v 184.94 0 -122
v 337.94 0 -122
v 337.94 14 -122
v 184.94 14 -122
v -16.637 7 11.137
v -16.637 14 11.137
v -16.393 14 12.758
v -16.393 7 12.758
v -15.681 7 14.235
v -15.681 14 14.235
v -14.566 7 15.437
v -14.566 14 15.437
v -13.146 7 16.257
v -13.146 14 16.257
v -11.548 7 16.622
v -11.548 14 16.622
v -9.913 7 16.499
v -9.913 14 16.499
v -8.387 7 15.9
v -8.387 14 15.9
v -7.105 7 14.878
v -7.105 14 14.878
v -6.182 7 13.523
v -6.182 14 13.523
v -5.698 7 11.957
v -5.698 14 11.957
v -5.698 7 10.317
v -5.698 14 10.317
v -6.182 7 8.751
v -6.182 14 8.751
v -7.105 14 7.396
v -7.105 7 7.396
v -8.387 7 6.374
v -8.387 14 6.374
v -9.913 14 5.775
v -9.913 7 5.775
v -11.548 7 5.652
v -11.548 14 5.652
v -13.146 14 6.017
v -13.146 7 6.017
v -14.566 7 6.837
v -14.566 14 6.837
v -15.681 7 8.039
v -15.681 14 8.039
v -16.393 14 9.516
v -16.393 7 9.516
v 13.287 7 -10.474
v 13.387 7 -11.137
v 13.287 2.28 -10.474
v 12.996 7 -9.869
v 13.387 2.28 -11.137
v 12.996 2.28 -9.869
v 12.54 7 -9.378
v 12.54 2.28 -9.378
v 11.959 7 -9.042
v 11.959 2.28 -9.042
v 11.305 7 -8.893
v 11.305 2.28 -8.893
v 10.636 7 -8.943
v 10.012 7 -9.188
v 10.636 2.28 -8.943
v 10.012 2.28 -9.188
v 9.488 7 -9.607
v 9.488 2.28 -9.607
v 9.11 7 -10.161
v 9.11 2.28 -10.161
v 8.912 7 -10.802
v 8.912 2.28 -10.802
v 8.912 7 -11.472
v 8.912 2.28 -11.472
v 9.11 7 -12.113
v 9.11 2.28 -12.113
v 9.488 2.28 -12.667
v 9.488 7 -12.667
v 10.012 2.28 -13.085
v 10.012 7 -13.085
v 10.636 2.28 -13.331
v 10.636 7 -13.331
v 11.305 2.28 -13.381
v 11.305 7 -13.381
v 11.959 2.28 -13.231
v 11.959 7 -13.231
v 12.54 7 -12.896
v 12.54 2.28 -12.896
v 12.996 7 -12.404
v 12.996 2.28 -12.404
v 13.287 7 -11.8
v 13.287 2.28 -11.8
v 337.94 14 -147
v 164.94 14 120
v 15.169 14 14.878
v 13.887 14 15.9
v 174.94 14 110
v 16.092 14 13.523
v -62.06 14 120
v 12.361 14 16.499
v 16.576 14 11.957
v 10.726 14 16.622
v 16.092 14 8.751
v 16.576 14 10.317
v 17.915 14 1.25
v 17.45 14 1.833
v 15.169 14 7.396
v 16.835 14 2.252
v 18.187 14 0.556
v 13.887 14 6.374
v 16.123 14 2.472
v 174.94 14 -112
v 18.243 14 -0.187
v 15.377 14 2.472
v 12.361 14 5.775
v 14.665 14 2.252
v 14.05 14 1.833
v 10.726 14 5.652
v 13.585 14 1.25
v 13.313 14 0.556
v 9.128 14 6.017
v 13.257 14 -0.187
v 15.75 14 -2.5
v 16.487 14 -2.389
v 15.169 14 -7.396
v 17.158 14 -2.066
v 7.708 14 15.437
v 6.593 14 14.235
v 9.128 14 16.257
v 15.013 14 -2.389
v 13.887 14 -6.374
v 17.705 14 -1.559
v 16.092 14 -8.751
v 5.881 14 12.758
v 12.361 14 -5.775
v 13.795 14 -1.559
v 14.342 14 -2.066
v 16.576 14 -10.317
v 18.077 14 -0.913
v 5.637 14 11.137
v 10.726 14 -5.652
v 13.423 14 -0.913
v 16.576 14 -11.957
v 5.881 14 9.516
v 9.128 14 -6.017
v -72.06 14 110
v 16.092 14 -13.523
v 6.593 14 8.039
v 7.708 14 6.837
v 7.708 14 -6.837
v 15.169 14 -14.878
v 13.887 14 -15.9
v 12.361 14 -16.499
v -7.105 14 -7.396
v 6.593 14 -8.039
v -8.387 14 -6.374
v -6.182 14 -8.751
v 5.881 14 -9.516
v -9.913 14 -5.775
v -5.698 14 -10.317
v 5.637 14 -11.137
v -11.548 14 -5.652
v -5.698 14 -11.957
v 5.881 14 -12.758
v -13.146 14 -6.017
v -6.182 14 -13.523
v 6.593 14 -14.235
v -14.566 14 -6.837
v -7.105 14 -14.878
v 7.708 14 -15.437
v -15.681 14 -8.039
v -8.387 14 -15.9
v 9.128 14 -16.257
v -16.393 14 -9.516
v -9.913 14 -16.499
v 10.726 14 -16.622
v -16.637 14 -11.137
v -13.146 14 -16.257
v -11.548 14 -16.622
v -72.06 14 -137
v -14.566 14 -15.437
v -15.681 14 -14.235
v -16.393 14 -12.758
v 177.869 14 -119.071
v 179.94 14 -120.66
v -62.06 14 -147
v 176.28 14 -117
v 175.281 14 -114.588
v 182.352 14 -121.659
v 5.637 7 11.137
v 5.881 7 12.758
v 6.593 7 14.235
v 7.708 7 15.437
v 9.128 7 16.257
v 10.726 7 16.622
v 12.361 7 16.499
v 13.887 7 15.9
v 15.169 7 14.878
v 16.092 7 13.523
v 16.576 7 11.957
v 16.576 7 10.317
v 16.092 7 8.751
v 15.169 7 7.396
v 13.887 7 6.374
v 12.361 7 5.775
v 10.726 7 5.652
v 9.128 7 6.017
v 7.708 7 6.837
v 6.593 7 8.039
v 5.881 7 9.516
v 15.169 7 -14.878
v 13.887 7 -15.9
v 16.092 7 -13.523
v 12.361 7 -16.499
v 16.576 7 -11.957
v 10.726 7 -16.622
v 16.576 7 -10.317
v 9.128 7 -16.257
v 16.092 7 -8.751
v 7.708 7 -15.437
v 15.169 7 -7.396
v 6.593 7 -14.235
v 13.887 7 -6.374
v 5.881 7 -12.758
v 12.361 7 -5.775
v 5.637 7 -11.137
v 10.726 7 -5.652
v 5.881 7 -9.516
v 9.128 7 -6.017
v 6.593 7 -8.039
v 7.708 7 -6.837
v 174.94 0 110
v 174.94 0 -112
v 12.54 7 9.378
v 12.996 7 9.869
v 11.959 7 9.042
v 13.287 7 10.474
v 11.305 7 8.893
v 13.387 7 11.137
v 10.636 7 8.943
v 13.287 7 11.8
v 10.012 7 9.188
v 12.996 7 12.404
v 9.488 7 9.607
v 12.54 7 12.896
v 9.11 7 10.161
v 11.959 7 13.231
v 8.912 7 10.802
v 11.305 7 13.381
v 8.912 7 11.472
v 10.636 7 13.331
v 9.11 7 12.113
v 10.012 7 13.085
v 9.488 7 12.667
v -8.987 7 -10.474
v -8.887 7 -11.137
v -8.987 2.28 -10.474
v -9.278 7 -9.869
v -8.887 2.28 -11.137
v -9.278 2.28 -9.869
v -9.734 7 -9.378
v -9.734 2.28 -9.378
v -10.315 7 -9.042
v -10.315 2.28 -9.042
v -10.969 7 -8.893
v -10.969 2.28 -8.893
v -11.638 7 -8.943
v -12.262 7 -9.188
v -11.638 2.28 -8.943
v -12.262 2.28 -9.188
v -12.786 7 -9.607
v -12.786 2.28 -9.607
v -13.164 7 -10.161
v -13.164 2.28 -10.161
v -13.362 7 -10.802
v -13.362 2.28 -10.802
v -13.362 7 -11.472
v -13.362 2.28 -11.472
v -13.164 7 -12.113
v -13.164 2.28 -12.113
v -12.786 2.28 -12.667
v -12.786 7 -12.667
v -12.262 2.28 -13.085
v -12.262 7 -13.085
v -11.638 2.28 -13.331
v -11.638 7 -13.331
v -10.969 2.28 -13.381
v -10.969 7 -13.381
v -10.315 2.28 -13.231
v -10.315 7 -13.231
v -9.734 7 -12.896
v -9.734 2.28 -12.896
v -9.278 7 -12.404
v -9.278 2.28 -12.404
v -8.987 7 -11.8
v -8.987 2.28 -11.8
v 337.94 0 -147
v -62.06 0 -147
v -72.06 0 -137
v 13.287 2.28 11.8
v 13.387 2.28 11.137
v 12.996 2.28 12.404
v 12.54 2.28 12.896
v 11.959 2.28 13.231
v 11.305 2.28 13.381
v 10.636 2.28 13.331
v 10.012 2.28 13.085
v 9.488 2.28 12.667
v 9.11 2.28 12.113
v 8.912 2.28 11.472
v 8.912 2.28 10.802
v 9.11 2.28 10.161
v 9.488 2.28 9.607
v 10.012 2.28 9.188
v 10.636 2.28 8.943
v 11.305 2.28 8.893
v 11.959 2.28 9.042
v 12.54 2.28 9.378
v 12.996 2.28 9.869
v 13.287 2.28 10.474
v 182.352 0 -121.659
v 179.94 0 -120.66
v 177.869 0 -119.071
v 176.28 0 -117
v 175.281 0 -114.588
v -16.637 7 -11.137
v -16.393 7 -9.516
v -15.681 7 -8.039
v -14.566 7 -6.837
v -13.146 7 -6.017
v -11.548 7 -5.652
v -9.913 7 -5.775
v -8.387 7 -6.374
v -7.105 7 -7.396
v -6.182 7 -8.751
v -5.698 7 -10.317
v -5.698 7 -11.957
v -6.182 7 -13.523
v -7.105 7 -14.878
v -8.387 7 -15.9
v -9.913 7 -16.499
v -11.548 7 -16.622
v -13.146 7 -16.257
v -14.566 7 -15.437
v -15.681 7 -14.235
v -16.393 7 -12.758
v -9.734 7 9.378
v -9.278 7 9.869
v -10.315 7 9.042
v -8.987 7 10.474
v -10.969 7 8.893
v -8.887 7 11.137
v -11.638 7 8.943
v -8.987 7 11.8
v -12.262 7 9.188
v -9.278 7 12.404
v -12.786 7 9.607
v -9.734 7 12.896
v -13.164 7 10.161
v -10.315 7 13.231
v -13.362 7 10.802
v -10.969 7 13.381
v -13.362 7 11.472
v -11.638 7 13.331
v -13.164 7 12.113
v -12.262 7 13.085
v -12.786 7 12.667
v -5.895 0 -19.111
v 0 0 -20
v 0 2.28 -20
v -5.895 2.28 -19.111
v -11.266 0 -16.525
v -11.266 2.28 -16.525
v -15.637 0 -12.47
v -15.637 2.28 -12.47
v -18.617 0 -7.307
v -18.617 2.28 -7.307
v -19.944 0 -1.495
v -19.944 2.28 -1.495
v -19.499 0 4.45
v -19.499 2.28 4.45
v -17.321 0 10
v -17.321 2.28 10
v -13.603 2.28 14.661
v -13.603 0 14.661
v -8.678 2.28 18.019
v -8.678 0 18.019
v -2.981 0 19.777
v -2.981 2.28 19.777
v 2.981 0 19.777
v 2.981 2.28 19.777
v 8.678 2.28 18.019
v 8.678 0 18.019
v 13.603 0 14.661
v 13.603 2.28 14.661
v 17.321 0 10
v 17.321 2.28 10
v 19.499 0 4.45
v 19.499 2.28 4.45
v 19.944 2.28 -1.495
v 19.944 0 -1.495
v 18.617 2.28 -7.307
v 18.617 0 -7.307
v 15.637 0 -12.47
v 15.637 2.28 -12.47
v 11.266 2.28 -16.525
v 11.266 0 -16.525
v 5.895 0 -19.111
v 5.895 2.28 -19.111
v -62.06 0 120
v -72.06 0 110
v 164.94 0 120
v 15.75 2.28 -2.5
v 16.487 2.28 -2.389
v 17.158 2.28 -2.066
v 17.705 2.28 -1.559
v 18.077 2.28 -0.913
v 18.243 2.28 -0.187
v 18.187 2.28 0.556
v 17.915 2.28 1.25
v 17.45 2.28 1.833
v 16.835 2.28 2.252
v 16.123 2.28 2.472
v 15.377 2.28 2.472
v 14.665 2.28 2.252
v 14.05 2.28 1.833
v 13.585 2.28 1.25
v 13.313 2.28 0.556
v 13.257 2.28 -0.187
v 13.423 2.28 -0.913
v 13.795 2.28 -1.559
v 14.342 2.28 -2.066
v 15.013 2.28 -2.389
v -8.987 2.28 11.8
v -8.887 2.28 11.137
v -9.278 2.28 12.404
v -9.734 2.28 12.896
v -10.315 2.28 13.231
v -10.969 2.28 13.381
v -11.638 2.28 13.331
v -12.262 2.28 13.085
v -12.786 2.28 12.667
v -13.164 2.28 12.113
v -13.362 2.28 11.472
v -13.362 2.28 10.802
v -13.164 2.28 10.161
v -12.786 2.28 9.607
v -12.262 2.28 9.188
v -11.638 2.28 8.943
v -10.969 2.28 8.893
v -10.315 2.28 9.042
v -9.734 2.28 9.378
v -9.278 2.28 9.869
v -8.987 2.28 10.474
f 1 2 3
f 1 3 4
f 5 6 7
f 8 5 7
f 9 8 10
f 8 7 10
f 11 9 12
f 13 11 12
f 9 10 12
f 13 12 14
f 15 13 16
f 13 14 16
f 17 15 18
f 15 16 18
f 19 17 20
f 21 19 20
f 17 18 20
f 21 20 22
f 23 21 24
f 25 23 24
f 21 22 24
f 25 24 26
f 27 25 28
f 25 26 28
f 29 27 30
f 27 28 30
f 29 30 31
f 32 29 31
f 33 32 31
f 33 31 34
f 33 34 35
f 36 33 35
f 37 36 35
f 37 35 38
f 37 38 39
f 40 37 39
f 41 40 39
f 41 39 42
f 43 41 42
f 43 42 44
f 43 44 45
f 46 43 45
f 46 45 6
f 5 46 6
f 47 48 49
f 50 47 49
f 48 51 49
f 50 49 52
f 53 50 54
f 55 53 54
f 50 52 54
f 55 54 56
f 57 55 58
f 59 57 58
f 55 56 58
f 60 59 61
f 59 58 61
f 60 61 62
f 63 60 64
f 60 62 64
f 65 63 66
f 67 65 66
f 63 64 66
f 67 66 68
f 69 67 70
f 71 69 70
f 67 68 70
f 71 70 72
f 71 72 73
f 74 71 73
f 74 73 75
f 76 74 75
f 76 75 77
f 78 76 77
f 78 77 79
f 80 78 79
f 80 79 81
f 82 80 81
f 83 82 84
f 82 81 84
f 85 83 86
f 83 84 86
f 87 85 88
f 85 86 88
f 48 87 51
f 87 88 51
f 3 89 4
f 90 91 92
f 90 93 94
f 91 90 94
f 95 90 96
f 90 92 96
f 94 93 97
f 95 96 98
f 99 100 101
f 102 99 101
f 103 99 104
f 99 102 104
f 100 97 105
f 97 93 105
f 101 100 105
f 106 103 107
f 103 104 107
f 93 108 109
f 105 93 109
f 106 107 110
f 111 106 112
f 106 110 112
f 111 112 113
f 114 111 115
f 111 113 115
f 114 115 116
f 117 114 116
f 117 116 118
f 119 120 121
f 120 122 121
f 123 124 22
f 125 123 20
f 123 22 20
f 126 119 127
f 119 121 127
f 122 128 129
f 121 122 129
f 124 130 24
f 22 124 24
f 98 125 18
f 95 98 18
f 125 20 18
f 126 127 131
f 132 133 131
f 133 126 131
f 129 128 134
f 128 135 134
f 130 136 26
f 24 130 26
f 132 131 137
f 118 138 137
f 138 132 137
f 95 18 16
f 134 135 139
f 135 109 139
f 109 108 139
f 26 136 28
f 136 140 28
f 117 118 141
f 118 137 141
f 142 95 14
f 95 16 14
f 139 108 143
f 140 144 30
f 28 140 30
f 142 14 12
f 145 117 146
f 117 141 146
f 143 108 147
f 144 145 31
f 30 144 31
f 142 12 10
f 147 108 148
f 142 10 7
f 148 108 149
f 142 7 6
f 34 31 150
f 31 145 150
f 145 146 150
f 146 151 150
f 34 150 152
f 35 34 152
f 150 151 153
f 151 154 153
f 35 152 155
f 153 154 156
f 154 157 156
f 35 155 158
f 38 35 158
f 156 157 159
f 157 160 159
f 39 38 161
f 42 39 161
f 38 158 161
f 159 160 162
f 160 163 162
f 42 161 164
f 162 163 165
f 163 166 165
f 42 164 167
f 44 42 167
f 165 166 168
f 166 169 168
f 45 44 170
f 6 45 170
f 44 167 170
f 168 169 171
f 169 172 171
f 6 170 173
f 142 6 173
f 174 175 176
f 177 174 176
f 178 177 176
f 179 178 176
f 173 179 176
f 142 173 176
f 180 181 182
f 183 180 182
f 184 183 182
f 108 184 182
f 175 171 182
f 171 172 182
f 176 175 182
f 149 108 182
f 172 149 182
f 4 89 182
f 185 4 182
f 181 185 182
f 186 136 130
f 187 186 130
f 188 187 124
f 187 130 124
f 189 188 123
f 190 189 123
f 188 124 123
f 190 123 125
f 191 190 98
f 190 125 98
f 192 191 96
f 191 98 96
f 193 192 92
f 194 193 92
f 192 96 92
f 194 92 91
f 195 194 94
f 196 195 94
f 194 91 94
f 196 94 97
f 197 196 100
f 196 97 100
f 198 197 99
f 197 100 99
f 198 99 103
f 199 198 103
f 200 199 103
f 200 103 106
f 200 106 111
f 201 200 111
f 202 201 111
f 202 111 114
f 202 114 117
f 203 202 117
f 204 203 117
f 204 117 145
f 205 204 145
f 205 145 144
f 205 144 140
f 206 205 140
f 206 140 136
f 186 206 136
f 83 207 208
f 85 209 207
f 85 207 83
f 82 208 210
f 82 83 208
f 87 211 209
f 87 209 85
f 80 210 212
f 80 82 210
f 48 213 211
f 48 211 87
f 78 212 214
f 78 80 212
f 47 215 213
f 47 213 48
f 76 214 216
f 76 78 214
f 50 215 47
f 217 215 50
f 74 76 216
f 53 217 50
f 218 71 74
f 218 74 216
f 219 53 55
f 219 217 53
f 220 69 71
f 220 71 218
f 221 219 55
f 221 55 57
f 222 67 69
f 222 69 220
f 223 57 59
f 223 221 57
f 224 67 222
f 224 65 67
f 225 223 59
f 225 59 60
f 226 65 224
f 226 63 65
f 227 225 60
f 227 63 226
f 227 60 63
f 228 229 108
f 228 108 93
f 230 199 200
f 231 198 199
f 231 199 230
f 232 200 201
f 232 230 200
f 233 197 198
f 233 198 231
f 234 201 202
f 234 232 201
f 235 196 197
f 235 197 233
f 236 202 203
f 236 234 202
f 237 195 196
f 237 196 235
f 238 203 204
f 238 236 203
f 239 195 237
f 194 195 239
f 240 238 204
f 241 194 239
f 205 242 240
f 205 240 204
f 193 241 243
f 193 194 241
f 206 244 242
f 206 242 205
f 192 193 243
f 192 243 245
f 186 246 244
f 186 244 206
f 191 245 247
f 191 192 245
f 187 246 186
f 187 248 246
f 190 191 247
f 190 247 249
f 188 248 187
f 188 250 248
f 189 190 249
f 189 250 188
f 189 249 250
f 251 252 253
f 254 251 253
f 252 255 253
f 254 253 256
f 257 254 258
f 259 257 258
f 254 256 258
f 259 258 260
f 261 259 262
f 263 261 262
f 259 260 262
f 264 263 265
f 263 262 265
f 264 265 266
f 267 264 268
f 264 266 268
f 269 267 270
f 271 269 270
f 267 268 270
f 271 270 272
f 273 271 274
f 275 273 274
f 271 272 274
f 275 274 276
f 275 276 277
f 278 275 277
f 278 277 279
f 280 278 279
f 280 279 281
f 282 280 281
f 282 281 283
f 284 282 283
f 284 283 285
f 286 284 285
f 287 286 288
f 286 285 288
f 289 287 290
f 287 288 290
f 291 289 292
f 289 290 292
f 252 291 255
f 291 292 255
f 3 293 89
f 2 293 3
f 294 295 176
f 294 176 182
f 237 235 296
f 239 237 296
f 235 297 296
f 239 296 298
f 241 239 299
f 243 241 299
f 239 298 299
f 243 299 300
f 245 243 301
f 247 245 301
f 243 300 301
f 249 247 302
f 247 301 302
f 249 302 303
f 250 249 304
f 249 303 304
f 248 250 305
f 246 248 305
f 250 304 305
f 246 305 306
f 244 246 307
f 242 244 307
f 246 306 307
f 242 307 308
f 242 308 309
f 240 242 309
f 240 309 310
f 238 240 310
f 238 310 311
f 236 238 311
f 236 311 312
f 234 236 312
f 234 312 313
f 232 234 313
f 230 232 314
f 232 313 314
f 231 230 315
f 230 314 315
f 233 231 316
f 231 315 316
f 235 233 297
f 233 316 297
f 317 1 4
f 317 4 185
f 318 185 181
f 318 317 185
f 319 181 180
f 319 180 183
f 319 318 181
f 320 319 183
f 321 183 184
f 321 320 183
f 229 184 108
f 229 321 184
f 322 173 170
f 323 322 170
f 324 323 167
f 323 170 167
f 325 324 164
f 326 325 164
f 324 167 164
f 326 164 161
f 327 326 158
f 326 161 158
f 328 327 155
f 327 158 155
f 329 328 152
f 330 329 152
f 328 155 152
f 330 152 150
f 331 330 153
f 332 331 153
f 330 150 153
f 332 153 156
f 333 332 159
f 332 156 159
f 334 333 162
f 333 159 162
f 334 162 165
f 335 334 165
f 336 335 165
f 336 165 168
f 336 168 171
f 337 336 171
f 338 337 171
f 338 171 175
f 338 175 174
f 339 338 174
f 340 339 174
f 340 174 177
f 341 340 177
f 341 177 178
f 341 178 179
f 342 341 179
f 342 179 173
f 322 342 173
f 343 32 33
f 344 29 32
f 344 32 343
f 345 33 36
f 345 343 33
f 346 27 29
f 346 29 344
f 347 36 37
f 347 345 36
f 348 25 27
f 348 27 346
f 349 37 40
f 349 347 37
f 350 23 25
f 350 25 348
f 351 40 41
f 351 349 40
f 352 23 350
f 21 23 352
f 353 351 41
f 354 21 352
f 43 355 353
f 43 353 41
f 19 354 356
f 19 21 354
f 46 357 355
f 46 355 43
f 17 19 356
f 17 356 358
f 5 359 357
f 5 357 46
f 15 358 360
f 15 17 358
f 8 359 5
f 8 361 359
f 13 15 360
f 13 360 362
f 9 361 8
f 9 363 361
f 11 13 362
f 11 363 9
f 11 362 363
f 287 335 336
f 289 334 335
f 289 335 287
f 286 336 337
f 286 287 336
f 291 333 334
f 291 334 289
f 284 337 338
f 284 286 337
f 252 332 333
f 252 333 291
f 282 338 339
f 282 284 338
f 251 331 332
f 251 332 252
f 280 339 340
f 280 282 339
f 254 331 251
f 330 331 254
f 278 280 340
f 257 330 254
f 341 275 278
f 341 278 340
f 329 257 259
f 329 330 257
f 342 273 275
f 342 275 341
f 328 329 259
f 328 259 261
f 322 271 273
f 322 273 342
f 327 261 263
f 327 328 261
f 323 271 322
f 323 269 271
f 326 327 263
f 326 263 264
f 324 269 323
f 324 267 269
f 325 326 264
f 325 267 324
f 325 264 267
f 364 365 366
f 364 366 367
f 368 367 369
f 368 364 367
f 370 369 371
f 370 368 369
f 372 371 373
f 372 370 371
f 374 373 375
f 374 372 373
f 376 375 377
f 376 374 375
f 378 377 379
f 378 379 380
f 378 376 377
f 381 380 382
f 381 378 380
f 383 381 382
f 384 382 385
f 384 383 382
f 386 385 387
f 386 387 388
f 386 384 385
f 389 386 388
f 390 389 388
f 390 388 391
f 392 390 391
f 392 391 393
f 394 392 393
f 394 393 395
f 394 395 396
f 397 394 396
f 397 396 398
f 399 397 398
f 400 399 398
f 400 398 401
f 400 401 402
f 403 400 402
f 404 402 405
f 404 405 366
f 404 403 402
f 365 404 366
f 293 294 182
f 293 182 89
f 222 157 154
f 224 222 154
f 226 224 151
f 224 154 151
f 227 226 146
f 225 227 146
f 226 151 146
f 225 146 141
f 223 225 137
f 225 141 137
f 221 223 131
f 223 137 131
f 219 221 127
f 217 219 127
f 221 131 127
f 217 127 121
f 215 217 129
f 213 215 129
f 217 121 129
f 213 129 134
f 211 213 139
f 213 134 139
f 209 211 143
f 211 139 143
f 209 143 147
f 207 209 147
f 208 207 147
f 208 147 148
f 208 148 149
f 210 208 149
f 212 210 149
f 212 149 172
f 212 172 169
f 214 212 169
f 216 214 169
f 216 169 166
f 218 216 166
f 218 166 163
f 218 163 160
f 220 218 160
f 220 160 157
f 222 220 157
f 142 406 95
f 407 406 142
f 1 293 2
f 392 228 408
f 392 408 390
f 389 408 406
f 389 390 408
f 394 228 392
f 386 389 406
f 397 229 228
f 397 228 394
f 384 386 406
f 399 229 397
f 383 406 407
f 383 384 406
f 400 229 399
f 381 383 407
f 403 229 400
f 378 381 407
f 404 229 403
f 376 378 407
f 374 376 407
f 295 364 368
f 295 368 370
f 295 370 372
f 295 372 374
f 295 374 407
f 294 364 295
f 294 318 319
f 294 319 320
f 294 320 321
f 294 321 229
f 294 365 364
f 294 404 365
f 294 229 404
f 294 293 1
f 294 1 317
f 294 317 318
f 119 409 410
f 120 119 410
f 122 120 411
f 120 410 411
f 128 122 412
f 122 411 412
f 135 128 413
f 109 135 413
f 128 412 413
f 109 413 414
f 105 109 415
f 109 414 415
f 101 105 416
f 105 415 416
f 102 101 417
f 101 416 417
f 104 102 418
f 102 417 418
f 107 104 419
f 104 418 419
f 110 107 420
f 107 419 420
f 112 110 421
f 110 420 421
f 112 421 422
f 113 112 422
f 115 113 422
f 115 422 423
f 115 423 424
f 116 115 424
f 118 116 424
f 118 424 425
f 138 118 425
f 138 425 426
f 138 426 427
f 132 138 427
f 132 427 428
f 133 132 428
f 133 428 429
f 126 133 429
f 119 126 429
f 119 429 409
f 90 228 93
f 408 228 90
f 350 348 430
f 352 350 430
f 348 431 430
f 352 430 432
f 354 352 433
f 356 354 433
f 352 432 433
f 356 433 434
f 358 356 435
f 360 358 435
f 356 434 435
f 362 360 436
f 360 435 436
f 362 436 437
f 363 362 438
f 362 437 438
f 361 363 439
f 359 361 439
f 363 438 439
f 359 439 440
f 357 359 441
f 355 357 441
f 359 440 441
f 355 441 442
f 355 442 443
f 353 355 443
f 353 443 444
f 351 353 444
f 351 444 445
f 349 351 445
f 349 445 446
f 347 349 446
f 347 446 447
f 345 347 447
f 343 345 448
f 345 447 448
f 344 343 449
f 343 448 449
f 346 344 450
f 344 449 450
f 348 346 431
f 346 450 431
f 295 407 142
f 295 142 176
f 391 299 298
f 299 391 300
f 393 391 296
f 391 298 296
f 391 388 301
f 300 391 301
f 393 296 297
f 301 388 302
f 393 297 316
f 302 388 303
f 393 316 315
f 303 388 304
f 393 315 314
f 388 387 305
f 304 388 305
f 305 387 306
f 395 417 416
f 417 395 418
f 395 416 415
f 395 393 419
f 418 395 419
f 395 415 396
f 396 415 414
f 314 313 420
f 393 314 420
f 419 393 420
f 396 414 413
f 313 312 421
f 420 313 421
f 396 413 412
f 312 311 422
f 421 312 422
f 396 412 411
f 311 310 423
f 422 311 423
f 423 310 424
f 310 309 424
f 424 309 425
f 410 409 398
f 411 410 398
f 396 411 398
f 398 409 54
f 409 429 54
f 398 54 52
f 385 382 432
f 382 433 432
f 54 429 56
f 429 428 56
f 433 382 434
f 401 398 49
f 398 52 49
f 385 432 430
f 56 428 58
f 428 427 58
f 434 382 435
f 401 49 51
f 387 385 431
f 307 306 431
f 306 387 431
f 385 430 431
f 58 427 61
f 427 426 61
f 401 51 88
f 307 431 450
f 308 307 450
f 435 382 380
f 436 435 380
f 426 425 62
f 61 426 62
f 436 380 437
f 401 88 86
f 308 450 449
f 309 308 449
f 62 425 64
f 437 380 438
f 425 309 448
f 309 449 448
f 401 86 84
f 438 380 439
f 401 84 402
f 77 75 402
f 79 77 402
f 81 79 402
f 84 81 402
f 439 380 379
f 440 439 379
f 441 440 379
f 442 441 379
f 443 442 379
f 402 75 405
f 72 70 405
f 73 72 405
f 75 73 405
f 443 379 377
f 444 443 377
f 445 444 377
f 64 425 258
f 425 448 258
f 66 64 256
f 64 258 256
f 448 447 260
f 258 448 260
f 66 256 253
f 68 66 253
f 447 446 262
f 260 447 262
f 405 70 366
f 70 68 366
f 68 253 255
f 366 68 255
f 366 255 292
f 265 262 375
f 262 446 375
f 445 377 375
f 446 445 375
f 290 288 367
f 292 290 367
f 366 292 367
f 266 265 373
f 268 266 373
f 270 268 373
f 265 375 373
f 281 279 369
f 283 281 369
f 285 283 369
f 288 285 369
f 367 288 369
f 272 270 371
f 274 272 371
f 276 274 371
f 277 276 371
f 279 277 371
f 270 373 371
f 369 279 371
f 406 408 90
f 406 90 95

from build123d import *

# Parameters (mm, degrees)
BOSS_EXTRUDE1_DEPTH                                 = 14
SKETCH2_R                                           = 20
CUT_EXTRUDE1_DEPTH                                  = 2.28
CBORE_FOR_00_BINDING_HEAD_MACHINE_SCREW_D           = 4.499991
CBORE_FOR_00_BINDING_HEAD_MACHINE_SCREW_CBORE_D     = 11.0000034
CBORE_FOR_00_BINDING_HEAD_MACHINE_SCREW_CBORE_DEPTH = 7.0000114
SKETCH5_R                                           = 2.5
CUT_EXTRUDE2_DEPTH                                  = 369.713712791


with BuildPart() as part:
    # Sketch1 → Boss-Extrude1 (new body)
    with BuildSketch(Plane(origin=(0, 0, 0), x_dir=(1, 0, 0), z_dir=(0, 1, 0))):
        with BuildLine():
            Line((337.94, 147), (337.94, 122))
            Line((337.94, 122), (184.94, 122))
            ThreePointArc((184.94, 122), (177.868932188, 119.071067812), (174.94, 112))
            Line((174.94, 112), (174.94, -110))
            Line((174.94, -110), (164.94, -120))
            Line((164.94, -120), (-62.06, -120))
            Line((-62.06, -120), (-72.06, -110))
            Line((-72.06, -110), (-72.06, 137))
            Line((-72.06, 137), (-62.06, 147))
            Line((-62.06, 147), (337.94, 147))
        make_face()
    extrude(amount=BOSS_EXTRUDE1_DEPTH)

    # Sketch2 → Cut-Extrude1 (cut)
    with BuildSketch(Plane(origin=(0, 0, 0), x_dir=(1, 0, 0), z_dir=(0, 1, 0))):
        with Locations(Location((0, 0, 0), (0, 0, 90))):
            Circle(SKETCH2_R)
    extrude(amount=CUT_EXTRUDE1_DEPTH, mode=Mode.SUBTRACT)

    # CBORE for #00 Binding Head Machine Screw1 (through all)
    with Locations(Plane(origin=(0, 14, 0), x_dir=(-1, 0, 0), z_dir=(0, 1, 0))):
        with Locations((11.136931804, 11.136931804), (-11.136931804, 11.136931804), (-11.136931804, -11.136931804), (11.136931804, -11.136931804)):
            CounterBoreHole(CBORE_FOR_00_BINDING_HEAD_MACHINE_SCREW_D / 2, CBORE_FOR_00_BINDING_HEAD_MACHINE_SCREW_CBORE_D / 2, CBORE_FOR_00_BINDING_HEAD_MACHINE_SCREW_CBORE_DEPTH)

    # Sketch5 → Cut-Extrude2 (cut, through all)
    with BuildSketch(Plane(origin=(0, 2.28, 0), x_dir=(-1, 0, 0), z_dir=(0, -1, 0))):
        with Locations(Location((-15.75, 0, 0), (0, 0, 90))):
            Circle(SKETCH5_R)
    extrude(amount=-CUT_EXTRUDE2_DEPTH, mode=Mode.SUBTRACT)


solid = part.part
